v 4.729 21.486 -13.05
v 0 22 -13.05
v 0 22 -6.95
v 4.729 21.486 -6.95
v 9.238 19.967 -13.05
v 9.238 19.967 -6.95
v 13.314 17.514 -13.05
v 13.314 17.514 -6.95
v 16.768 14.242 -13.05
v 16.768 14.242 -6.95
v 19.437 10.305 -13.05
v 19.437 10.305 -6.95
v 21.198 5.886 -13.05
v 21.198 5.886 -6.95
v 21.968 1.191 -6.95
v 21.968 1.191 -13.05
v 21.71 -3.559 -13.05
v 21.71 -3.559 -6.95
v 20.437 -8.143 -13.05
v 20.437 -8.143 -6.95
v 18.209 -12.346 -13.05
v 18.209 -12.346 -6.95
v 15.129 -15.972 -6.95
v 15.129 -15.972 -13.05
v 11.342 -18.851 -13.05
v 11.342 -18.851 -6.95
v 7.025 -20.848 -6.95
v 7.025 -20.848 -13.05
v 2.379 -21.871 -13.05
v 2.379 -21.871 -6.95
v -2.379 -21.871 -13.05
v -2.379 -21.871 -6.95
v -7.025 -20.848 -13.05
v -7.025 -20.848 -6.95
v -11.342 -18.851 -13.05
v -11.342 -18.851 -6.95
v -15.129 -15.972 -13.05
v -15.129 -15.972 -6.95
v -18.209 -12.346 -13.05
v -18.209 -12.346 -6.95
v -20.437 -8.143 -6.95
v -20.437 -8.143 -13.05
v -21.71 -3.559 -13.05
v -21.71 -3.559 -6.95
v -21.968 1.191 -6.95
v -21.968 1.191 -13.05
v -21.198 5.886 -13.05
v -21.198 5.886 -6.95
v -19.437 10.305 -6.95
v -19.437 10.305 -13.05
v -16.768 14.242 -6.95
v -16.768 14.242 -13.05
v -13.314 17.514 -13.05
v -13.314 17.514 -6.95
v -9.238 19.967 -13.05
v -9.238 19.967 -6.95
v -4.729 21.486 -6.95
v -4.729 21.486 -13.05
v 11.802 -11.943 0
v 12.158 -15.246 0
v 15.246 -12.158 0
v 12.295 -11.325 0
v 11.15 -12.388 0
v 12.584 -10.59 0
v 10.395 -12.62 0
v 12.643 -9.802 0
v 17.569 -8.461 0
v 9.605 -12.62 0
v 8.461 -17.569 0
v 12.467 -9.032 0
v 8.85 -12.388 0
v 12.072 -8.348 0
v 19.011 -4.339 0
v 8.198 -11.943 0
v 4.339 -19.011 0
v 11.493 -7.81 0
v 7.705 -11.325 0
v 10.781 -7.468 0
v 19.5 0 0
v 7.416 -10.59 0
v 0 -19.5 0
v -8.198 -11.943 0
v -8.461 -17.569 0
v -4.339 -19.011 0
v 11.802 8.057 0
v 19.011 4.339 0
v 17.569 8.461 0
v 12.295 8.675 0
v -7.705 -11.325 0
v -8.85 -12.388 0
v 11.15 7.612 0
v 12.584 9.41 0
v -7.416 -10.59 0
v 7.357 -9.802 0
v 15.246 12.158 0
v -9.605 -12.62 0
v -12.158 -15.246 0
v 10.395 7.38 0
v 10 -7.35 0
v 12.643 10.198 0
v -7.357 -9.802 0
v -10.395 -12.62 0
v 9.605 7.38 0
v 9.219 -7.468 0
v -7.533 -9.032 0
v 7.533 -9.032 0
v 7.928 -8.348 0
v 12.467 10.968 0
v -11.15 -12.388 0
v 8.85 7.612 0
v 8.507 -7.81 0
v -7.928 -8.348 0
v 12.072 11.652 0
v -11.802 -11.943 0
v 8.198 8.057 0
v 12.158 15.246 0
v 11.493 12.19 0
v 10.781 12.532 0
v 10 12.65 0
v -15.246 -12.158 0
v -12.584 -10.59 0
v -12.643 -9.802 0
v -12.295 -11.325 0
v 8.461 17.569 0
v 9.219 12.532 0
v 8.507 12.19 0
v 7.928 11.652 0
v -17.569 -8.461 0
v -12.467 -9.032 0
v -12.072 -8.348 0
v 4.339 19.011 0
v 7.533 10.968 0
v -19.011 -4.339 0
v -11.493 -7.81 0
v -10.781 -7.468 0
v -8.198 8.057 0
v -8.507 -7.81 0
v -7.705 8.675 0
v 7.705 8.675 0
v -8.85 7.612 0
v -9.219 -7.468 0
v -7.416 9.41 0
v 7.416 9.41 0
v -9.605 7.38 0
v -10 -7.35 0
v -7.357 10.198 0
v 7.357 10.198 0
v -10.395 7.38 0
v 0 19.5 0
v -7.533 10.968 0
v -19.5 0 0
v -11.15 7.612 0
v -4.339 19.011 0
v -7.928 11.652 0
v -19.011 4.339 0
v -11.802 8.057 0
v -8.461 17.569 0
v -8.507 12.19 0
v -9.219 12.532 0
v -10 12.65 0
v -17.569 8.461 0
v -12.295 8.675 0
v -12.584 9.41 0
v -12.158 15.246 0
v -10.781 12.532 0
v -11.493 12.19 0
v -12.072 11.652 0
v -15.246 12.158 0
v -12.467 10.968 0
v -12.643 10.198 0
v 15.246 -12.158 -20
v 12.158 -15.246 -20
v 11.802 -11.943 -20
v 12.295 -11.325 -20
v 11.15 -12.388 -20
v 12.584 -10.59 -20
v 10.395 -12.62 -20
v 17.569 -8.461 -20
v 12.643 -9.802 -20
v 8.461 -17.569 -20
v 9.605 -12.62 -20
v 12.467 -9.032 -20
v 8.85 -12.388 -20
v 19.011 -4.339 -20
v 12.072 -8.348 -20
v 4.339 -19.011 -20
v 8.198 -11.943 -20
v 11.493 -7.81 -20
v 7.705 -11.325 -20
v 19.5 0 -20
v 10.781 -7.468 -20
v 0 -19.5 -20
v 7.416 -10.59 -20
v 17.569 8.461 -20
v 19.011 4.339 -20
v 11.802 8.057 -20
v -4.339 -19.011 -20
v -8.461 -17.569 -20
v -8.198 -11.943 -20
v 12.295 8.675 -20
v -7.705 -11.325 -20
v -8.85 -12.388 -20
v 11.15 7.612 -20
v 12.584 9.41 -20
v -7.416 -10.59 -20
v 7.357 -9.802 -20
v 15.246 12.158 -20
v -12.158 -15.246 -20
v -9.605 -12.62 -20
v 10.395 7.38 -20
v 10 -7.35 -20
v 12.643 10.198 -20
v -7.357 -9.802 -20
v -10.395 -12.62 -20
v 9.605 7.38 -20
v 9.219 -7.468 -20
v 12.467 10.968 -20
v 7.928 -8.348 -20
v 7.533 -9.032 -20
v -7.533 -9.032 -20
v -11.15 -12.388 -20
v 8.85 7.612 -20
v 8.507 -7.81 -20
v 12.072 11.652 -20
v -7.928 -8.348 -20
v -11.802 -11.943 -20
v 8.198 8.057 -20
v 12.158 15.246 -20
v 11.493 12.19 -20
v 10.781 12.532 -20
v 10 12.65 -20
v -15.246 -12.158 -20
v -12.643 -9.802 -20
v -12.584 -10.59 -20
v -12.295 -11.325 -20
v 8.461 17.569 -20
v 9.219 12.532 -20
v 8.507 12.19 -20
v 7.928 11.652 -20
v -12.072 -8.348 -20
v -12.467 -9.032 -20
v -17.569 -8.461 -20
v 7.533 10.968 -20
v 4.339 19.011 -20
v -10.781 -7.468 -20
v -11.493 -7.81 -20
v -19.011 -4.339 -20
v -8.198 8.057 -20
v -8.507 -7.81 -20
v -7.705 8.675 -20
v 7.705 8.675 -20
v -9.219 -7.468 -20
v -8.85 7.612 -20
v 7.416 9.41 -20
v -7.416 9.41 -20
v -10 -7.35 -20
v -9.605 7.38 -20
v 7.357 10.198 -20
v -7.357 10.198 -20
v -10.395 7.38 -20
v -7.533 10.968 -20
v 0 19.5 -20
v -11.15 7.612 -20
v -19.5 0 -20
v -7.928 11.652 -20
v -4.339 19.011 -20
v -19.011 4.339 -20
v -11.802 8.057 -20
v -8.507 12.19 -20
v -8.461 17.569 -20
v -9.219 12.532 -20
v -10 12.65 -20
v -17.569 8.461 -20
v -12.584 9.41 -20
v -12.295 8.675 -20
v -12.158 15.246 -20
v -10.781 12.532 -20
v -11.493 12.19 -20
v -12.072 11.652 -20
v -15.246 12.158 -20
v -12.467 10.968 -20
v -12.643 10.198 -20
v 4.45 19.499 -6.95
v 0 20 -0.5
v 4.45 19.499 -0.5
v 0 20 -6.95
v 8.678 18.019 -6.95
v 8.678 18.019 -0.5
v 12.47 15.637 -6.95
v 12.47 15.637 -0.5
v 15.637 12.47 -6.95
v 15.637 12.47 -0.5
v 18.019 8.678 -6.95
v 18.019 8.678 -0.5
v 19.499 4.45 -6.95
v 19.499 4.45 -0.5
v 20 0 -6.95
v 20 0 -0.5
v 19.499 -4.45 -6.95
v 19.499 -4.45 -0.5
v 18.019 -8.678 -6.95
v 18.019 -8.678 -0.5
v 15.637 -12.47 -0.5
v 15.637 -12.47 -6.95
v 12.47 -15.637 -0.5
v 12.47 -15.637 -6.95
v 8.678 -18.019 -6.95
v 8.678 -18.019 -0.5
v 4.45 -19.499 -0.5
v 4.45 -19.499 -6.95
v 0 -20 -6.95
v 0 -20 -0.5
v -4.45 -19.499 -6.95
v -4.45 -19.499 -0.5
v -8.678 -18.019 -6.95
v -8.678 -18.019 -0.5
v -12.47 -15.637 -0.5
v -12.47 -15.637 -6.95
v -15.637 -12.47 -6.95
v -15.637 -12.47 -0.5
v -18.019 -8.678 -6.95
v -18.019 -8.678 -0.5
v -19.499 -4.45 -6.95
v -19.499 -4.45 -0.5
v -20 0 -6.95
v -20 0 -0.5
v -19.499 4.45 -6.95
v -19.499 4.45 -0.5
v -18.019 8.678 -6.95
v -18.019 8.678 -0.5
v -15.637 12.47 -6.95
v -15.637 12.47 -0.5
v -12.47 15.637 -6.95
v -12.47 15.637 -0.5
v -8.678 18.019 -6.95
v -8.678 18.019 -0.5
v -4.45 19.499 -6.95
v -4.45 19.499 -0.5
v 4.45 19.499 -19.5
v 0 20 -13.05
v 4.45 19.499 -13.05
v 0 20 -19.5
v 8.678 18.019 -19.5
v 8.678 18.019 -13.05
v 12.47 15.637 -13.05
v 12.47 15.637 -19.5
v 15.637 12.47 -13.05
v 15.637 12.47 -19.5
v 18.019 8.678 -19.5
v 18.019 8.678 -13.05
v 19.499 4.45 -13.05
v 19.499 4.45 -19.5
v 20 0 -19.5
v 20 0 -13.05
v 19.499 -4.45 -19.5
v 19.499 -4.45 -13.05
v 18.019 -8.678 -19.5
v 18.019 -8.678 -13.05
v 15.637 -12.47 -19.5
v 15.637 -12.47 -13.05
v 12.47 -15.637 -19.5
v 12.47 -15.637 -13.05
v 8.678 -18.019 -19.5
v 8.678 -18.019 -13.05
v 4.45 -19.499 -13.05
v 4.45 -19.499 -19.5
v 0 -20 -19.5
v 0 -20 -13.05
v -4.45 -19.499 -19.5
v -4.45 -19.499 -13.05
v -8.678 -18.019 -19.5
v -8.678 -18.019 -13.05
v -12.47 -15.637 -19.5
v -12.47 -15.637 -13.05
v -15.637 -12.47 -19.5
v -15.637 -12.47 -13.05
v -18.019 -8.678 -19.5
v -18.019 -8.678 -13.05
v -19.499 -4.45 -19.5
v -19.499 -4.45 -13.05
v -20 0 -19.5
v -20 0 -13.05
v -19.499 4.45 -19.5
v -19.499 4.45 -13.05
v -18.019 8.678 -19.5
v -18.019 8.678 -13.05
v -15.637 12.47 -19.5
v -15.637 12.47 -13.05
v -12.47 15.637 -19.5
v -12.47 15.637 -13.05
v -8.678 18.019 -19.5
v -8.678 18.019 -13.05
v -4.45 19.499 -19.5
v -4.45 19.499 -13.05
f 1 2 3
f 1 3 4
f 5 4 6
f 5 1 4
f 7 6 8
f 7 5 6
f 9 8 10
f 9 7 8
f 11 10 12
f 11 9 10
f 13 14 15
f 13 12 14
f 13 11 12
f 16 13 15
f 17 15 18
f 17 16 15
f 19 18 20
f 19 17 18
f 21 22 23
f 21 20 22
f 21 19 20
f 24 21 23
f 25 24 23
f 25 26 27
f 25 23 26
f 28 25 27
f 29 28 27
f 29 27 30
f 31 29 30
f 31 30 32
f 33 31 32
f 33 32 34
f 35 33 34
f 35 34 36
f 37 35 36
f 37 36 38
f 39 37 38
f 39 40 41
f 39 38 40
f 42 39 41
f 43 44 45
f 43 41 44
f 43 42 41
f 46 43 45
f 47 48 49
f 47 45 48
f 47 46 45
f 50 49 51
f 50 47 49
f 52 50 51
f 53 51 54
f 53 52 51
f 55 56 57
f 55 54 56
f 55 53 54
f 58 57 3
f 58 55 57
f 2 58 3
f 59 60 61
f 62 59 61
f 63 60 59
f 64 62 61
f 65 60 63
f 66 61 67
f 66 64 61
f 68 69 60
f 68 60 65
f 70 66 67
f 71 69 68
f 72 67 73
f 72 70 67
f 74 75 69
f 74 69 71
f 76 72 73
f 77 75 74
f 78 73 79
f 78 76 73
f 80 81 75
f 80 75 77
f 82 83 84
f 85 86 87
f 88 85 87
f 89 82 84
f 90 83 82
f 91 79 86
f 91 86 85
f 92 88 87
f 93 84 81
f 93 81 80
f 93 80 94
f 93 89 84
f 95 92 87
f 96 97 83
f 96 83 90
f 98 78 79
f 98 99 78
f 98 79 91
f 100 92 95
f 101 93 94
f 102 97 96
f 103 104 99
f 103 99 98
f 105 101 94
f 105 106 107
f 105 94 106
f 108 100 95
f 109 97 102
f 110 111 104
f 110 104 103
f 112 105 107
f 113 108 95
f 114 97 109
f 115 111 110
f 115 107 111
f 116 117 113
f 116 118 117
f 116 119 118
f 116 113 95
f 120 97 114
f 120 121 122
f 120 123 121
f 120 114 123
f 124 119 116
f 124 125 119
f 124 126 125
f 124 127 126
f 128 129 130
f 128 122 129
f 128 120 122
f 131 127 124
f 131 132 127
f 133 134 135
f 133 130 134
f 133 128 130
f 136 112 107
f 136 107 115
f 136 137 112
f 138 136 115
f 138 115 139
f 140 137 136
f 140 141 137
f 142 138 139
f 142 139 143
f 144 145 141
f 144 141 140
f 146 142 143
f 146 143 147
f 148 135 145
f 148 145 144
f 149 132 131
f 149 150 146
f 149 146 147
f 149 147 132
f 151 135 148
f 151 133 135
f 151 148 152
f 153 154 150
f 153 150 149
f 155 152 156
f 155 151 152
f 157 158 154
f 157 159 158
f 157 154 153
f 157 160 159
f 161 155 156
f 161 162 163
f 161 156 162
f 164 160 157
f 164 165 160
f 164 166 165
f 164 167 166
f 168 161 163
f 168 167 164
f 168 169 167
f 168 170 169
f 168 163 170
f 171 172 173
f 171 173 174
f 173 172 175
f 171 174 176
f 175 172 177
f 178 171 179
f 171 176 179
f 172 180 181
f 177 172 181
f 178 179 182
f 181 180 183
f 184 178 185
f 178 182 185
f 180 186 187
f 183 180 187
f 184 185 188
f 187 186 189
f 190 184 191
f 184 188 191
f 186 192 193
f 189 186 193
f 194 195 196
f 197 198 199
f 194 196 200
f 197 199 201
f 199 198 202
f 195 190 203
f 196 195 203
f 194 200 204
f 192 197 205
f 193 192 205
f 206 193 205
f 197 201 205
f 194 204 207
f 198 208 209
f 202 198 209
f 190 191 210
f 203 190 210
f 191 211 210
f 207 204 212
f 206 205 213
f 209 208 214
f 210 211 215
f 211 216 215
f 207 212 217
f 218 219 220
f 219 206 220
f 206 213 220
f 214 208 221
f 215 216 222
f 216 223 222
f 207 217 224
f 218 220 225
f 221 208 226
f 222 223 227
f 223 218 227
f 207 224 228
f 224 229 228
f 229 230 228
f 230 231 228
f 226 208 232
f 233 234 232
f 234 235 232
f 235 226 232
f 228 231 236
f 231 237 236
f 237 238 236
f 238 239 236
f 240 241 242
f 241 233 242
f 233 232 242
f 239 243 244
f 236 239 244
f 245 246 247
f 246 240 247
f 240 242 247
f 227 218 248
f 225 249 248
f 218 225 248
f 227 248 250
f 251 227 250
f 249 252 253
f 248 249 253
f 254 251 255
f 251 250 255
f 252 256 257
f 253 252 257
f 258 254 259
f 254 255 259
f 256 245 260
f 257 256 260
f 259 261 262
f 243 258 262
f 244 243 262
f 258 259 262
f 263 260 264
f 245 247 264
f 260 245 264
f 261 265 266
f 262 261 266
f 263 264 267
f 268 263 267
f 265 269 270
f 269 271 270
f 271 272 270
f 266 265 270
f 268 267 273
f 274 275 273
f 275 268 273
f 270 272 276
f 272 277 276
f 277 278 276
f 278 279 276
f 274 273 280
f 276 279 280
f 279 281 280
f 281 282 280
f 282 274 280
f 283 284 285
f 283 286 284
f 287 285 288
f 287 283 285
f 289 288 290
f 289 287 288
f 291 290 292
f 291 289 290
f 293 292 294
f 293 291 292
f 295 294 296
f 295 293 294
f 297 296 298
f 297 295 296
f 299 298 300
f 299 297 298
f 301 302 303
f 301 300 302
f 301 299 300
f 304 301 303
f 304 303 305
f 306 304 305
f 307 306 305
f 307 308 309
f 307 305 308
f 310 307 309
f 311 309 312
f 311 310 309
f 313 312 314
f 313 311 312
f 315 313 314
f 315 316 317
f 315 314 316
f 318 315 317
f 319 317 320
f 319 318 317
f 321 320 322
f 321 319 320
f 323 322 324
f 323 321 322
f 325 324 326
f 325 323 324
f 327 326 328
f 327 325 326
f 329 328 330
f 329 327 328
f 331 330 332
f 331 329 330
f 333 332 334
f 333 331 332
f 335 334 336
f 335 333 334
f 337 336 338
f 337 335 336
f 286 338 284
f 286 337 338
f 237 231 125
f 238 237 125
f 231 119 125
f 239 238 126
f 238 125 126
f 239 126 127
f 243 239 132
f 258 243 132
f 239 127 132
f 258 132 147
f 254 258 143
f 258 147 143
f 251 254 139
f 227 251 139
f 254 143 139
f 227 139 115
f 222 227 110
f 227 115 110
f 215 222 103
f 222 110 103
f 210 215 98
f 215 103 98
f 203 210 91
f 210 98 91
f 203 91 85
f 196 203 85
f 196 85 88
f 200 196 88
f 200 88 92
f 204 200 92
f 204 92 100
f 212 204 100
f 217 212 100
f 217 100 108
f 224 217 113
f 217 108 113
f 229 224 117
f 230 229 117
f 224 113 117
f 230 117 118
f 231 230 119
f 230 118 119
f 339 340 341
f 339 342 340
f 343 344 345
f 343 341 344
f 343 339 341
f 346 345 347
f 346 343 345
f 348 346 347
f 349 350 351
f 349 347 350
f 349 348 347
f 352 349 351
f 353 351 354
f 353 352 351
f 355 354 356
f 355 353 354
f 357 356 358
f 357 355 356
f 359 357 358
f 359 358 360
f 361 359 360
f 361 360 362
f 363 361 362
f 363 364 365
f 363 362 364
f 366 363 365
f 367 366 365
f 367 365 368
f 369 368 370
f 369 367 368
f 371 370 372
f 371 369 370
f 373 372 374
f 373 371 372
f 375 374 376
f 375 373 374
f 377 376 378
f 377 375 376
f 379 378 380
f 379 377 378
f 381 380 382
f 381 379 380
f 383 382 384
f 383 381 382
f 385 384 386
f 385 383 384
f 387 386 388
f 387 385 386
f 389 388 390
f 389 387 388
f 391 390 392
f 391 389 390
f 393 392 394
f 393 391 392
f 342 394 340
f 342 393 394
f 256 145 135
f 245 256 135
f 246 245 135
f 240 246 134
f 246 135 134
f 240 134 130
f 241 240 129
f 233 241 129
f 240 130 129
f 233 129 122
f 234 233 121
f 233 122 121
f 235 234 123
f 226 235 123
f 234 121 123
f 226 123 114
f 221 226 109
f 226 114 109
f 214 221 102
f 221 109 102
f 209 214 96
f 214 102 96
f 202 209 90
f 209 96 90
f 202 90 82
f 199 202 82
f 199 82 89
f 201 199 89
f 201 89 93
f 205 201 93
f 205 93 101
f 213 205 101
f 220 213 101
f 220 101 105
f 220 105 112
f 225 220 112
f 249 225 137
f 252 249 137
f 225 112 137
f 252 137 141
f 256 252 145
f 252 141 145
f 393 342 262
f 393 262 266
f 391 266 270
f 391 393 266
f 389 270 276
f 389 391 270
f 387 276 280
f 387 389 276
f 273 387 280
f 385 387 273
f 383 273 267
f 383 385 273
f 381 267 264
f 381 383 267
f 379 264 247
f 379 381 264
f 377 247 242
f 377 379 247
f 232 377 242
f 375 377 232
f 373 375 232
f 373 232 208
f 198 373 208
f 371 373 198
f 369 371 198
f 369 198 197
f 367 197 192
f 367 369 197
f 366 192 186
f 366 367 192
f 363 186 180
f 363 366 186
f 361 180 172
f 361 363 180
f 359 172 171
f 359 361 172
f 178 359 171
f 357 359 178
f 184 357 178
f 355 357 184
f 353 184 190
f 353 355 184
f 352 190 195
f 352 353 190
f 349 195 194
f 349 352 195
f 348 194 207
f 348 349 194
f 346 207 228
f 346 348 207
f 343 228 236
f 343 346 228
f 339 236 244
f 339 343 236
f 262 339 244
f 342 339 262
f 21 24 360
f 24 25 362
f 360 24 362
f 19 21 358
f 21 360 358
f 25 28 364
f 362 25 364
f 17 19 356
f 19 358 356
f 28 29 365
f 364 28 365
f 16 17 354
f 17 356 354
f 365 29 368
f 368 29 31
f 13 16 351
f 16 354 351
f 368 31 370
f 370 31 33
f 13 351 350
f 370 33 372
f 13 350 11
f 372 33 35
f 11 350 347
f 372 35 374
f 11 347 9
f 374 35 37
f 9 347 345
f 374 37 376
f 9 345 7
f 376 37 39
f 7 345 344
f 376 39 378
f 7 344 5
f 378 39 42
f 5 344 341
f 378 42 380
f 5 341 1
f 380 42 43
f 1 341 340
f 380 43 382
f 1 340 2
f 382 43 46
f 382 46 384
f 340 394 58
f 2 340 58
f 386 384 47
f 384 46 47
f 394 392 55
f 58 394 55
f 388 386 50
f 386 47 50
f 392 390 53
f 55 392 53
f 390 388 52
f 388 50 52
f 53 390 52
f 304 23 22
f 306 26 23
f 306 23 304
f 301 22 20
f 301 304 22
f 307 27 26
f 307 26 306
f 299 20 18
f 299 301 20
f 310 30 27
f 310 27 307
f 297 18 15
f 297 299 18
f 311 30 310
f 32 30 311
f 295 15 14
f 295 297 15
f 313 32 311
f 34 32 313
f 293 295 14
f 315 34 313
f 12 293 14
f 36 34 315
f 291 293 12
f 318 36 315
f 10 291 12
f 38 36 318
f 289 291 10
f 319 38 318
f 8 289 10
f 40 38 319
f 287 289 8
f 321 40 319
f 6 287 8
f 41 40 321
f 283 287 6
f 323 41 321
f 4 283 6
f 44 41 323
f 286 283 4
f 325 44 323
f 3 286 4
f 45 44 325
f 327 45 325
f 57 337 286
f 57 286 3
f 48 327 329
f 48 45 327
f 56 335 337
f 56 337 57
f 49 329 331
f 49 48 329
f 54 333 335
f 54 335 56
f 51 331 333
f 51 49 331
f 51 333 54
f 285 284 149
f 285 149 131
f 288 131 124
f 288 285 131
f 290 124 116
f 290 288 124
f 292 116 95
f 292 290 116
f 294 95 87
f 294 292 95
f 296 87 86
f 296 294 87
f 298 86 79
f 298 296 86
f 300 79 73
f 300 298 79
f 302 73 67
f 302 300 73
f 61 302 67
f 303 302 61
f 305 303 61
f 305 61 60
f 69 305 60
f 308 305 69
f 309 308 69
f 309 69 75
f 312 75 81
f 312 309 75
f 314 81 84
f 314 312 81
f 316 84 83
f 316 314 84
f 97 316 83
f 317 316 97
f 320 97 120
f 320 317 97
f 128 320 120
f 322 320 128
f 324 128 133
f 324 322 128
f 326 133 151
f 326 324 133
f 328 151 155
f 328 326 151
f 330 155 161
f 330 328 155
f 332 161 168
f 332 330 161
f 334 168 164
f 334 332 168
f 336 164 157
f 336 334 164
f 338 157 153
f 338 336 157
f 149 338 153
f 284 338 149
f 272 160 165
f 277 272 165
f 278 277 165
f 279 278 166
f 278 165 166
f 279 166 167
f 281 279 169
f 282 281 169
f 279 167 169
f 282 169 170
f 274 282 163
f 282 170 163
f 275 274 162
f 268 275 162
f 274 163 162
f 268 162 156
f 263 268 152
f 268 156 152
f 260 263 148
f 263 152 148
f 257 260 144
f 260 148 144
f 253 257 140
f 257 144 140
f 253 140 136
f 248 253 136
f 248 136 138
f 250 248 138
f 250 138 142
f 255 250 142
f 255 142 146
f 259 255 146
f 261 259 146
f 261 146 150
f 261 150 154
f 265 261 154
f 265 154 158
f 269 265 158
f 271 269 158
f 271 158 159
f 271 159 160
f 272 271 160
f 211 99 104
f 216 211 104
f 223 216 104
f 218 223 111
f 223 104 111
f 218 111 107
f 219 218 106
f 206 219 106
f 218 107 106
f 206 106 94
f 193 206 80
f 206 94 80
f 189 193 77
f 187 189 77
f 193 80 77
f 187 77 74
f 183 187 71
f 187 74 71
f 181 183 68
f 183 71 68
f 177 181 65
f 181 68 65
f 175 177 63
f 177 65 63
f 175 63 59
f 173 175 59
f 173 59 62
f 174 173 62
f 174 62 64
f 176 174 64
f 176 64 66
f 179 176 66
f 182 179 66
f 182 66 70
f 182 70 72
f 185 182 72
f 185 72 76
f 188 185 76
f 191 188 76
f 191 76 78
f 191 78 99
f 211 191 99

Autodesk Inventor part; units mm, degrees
ref_plane "YZ Plane" through (0, 0, 0) normal (1, 0, 0) x (0, 1, 0)
ref_plane "XZ Plane" through (0, 0, 0) normal (0, 1, 0) x (-1, 0, 0)
ref_plane "XY Plane" through (0, 0, 0) normal (0, 0, 1) x (1, 0, 0)
sketch "スケッチ1" plane through (0, 0, 0) normal (1, 0, 0) x (0, 1, 0)
  line L0 (0, 0) -> (20, 0)
  line L1 (20, -20) -> (0, -20)
  line L2 (0, -20) -> (0, 0)
  line L3 (20, 0) -> (20, -6.95)
  line L4 (20, -6.95) -> (22, -6.95)
  line L5 (22, -6.95) -> (22, -13.05)
  line L6 (22, -13.05) -> (20, -13.05)
  line L7 (20, -13.05) -> (20, -20)
  point P0 (12, 0)
  dimension "d0" = 20
  dimension "d34" = 2
  dimension "d35" = 6.95
  dimension "d36" = 20
  dimension "d37" = 6.95
revolve "回転1" add sketch "スケッチ1" angle 360 about axis through (0, 0, -20) along (0, 0, 1)
chamfer "面取り1" distance 0.5 angle 45 2 edges at (0, -20, 0) (0, -20, -20)
sketch "スケッチ4" plane through (0, 0, -20) normal (0, 0, -1) x (-1, 0, 0)
  line L0 (-10, 10) -> (10, 10)
  line L1 (10, 10) -> (10, -10)
  line L2 (10, -10) -> (-10, -10)
  line L3 (-10, -10) -> (-10, 10)
  line L4 (-10, 10) -> (10, -10) construction
  line L5 (10, 10) -> (-10, -10) construction
  point P0 (0, 0)
  dimension "d24" = 20
  dimension "d25" = 20
hole "穴2" at (-10, 10, -20) at (-10, -10, -20) at (10, -10, -20) at (10, 10, -20) direction (0, 0, 1) diameter 5.3 end through all clearance for "Socket Head Cap Screw" size "M5" standard "Ansi Metric M Profile"
ref_plane "作業平面1" through (0, 0, -10) normal (0, 0, 1) x (1, 0, 0)
equation "\"d37\" = d35"
properties part number "scara-base6" material "ABS プラスチック"
